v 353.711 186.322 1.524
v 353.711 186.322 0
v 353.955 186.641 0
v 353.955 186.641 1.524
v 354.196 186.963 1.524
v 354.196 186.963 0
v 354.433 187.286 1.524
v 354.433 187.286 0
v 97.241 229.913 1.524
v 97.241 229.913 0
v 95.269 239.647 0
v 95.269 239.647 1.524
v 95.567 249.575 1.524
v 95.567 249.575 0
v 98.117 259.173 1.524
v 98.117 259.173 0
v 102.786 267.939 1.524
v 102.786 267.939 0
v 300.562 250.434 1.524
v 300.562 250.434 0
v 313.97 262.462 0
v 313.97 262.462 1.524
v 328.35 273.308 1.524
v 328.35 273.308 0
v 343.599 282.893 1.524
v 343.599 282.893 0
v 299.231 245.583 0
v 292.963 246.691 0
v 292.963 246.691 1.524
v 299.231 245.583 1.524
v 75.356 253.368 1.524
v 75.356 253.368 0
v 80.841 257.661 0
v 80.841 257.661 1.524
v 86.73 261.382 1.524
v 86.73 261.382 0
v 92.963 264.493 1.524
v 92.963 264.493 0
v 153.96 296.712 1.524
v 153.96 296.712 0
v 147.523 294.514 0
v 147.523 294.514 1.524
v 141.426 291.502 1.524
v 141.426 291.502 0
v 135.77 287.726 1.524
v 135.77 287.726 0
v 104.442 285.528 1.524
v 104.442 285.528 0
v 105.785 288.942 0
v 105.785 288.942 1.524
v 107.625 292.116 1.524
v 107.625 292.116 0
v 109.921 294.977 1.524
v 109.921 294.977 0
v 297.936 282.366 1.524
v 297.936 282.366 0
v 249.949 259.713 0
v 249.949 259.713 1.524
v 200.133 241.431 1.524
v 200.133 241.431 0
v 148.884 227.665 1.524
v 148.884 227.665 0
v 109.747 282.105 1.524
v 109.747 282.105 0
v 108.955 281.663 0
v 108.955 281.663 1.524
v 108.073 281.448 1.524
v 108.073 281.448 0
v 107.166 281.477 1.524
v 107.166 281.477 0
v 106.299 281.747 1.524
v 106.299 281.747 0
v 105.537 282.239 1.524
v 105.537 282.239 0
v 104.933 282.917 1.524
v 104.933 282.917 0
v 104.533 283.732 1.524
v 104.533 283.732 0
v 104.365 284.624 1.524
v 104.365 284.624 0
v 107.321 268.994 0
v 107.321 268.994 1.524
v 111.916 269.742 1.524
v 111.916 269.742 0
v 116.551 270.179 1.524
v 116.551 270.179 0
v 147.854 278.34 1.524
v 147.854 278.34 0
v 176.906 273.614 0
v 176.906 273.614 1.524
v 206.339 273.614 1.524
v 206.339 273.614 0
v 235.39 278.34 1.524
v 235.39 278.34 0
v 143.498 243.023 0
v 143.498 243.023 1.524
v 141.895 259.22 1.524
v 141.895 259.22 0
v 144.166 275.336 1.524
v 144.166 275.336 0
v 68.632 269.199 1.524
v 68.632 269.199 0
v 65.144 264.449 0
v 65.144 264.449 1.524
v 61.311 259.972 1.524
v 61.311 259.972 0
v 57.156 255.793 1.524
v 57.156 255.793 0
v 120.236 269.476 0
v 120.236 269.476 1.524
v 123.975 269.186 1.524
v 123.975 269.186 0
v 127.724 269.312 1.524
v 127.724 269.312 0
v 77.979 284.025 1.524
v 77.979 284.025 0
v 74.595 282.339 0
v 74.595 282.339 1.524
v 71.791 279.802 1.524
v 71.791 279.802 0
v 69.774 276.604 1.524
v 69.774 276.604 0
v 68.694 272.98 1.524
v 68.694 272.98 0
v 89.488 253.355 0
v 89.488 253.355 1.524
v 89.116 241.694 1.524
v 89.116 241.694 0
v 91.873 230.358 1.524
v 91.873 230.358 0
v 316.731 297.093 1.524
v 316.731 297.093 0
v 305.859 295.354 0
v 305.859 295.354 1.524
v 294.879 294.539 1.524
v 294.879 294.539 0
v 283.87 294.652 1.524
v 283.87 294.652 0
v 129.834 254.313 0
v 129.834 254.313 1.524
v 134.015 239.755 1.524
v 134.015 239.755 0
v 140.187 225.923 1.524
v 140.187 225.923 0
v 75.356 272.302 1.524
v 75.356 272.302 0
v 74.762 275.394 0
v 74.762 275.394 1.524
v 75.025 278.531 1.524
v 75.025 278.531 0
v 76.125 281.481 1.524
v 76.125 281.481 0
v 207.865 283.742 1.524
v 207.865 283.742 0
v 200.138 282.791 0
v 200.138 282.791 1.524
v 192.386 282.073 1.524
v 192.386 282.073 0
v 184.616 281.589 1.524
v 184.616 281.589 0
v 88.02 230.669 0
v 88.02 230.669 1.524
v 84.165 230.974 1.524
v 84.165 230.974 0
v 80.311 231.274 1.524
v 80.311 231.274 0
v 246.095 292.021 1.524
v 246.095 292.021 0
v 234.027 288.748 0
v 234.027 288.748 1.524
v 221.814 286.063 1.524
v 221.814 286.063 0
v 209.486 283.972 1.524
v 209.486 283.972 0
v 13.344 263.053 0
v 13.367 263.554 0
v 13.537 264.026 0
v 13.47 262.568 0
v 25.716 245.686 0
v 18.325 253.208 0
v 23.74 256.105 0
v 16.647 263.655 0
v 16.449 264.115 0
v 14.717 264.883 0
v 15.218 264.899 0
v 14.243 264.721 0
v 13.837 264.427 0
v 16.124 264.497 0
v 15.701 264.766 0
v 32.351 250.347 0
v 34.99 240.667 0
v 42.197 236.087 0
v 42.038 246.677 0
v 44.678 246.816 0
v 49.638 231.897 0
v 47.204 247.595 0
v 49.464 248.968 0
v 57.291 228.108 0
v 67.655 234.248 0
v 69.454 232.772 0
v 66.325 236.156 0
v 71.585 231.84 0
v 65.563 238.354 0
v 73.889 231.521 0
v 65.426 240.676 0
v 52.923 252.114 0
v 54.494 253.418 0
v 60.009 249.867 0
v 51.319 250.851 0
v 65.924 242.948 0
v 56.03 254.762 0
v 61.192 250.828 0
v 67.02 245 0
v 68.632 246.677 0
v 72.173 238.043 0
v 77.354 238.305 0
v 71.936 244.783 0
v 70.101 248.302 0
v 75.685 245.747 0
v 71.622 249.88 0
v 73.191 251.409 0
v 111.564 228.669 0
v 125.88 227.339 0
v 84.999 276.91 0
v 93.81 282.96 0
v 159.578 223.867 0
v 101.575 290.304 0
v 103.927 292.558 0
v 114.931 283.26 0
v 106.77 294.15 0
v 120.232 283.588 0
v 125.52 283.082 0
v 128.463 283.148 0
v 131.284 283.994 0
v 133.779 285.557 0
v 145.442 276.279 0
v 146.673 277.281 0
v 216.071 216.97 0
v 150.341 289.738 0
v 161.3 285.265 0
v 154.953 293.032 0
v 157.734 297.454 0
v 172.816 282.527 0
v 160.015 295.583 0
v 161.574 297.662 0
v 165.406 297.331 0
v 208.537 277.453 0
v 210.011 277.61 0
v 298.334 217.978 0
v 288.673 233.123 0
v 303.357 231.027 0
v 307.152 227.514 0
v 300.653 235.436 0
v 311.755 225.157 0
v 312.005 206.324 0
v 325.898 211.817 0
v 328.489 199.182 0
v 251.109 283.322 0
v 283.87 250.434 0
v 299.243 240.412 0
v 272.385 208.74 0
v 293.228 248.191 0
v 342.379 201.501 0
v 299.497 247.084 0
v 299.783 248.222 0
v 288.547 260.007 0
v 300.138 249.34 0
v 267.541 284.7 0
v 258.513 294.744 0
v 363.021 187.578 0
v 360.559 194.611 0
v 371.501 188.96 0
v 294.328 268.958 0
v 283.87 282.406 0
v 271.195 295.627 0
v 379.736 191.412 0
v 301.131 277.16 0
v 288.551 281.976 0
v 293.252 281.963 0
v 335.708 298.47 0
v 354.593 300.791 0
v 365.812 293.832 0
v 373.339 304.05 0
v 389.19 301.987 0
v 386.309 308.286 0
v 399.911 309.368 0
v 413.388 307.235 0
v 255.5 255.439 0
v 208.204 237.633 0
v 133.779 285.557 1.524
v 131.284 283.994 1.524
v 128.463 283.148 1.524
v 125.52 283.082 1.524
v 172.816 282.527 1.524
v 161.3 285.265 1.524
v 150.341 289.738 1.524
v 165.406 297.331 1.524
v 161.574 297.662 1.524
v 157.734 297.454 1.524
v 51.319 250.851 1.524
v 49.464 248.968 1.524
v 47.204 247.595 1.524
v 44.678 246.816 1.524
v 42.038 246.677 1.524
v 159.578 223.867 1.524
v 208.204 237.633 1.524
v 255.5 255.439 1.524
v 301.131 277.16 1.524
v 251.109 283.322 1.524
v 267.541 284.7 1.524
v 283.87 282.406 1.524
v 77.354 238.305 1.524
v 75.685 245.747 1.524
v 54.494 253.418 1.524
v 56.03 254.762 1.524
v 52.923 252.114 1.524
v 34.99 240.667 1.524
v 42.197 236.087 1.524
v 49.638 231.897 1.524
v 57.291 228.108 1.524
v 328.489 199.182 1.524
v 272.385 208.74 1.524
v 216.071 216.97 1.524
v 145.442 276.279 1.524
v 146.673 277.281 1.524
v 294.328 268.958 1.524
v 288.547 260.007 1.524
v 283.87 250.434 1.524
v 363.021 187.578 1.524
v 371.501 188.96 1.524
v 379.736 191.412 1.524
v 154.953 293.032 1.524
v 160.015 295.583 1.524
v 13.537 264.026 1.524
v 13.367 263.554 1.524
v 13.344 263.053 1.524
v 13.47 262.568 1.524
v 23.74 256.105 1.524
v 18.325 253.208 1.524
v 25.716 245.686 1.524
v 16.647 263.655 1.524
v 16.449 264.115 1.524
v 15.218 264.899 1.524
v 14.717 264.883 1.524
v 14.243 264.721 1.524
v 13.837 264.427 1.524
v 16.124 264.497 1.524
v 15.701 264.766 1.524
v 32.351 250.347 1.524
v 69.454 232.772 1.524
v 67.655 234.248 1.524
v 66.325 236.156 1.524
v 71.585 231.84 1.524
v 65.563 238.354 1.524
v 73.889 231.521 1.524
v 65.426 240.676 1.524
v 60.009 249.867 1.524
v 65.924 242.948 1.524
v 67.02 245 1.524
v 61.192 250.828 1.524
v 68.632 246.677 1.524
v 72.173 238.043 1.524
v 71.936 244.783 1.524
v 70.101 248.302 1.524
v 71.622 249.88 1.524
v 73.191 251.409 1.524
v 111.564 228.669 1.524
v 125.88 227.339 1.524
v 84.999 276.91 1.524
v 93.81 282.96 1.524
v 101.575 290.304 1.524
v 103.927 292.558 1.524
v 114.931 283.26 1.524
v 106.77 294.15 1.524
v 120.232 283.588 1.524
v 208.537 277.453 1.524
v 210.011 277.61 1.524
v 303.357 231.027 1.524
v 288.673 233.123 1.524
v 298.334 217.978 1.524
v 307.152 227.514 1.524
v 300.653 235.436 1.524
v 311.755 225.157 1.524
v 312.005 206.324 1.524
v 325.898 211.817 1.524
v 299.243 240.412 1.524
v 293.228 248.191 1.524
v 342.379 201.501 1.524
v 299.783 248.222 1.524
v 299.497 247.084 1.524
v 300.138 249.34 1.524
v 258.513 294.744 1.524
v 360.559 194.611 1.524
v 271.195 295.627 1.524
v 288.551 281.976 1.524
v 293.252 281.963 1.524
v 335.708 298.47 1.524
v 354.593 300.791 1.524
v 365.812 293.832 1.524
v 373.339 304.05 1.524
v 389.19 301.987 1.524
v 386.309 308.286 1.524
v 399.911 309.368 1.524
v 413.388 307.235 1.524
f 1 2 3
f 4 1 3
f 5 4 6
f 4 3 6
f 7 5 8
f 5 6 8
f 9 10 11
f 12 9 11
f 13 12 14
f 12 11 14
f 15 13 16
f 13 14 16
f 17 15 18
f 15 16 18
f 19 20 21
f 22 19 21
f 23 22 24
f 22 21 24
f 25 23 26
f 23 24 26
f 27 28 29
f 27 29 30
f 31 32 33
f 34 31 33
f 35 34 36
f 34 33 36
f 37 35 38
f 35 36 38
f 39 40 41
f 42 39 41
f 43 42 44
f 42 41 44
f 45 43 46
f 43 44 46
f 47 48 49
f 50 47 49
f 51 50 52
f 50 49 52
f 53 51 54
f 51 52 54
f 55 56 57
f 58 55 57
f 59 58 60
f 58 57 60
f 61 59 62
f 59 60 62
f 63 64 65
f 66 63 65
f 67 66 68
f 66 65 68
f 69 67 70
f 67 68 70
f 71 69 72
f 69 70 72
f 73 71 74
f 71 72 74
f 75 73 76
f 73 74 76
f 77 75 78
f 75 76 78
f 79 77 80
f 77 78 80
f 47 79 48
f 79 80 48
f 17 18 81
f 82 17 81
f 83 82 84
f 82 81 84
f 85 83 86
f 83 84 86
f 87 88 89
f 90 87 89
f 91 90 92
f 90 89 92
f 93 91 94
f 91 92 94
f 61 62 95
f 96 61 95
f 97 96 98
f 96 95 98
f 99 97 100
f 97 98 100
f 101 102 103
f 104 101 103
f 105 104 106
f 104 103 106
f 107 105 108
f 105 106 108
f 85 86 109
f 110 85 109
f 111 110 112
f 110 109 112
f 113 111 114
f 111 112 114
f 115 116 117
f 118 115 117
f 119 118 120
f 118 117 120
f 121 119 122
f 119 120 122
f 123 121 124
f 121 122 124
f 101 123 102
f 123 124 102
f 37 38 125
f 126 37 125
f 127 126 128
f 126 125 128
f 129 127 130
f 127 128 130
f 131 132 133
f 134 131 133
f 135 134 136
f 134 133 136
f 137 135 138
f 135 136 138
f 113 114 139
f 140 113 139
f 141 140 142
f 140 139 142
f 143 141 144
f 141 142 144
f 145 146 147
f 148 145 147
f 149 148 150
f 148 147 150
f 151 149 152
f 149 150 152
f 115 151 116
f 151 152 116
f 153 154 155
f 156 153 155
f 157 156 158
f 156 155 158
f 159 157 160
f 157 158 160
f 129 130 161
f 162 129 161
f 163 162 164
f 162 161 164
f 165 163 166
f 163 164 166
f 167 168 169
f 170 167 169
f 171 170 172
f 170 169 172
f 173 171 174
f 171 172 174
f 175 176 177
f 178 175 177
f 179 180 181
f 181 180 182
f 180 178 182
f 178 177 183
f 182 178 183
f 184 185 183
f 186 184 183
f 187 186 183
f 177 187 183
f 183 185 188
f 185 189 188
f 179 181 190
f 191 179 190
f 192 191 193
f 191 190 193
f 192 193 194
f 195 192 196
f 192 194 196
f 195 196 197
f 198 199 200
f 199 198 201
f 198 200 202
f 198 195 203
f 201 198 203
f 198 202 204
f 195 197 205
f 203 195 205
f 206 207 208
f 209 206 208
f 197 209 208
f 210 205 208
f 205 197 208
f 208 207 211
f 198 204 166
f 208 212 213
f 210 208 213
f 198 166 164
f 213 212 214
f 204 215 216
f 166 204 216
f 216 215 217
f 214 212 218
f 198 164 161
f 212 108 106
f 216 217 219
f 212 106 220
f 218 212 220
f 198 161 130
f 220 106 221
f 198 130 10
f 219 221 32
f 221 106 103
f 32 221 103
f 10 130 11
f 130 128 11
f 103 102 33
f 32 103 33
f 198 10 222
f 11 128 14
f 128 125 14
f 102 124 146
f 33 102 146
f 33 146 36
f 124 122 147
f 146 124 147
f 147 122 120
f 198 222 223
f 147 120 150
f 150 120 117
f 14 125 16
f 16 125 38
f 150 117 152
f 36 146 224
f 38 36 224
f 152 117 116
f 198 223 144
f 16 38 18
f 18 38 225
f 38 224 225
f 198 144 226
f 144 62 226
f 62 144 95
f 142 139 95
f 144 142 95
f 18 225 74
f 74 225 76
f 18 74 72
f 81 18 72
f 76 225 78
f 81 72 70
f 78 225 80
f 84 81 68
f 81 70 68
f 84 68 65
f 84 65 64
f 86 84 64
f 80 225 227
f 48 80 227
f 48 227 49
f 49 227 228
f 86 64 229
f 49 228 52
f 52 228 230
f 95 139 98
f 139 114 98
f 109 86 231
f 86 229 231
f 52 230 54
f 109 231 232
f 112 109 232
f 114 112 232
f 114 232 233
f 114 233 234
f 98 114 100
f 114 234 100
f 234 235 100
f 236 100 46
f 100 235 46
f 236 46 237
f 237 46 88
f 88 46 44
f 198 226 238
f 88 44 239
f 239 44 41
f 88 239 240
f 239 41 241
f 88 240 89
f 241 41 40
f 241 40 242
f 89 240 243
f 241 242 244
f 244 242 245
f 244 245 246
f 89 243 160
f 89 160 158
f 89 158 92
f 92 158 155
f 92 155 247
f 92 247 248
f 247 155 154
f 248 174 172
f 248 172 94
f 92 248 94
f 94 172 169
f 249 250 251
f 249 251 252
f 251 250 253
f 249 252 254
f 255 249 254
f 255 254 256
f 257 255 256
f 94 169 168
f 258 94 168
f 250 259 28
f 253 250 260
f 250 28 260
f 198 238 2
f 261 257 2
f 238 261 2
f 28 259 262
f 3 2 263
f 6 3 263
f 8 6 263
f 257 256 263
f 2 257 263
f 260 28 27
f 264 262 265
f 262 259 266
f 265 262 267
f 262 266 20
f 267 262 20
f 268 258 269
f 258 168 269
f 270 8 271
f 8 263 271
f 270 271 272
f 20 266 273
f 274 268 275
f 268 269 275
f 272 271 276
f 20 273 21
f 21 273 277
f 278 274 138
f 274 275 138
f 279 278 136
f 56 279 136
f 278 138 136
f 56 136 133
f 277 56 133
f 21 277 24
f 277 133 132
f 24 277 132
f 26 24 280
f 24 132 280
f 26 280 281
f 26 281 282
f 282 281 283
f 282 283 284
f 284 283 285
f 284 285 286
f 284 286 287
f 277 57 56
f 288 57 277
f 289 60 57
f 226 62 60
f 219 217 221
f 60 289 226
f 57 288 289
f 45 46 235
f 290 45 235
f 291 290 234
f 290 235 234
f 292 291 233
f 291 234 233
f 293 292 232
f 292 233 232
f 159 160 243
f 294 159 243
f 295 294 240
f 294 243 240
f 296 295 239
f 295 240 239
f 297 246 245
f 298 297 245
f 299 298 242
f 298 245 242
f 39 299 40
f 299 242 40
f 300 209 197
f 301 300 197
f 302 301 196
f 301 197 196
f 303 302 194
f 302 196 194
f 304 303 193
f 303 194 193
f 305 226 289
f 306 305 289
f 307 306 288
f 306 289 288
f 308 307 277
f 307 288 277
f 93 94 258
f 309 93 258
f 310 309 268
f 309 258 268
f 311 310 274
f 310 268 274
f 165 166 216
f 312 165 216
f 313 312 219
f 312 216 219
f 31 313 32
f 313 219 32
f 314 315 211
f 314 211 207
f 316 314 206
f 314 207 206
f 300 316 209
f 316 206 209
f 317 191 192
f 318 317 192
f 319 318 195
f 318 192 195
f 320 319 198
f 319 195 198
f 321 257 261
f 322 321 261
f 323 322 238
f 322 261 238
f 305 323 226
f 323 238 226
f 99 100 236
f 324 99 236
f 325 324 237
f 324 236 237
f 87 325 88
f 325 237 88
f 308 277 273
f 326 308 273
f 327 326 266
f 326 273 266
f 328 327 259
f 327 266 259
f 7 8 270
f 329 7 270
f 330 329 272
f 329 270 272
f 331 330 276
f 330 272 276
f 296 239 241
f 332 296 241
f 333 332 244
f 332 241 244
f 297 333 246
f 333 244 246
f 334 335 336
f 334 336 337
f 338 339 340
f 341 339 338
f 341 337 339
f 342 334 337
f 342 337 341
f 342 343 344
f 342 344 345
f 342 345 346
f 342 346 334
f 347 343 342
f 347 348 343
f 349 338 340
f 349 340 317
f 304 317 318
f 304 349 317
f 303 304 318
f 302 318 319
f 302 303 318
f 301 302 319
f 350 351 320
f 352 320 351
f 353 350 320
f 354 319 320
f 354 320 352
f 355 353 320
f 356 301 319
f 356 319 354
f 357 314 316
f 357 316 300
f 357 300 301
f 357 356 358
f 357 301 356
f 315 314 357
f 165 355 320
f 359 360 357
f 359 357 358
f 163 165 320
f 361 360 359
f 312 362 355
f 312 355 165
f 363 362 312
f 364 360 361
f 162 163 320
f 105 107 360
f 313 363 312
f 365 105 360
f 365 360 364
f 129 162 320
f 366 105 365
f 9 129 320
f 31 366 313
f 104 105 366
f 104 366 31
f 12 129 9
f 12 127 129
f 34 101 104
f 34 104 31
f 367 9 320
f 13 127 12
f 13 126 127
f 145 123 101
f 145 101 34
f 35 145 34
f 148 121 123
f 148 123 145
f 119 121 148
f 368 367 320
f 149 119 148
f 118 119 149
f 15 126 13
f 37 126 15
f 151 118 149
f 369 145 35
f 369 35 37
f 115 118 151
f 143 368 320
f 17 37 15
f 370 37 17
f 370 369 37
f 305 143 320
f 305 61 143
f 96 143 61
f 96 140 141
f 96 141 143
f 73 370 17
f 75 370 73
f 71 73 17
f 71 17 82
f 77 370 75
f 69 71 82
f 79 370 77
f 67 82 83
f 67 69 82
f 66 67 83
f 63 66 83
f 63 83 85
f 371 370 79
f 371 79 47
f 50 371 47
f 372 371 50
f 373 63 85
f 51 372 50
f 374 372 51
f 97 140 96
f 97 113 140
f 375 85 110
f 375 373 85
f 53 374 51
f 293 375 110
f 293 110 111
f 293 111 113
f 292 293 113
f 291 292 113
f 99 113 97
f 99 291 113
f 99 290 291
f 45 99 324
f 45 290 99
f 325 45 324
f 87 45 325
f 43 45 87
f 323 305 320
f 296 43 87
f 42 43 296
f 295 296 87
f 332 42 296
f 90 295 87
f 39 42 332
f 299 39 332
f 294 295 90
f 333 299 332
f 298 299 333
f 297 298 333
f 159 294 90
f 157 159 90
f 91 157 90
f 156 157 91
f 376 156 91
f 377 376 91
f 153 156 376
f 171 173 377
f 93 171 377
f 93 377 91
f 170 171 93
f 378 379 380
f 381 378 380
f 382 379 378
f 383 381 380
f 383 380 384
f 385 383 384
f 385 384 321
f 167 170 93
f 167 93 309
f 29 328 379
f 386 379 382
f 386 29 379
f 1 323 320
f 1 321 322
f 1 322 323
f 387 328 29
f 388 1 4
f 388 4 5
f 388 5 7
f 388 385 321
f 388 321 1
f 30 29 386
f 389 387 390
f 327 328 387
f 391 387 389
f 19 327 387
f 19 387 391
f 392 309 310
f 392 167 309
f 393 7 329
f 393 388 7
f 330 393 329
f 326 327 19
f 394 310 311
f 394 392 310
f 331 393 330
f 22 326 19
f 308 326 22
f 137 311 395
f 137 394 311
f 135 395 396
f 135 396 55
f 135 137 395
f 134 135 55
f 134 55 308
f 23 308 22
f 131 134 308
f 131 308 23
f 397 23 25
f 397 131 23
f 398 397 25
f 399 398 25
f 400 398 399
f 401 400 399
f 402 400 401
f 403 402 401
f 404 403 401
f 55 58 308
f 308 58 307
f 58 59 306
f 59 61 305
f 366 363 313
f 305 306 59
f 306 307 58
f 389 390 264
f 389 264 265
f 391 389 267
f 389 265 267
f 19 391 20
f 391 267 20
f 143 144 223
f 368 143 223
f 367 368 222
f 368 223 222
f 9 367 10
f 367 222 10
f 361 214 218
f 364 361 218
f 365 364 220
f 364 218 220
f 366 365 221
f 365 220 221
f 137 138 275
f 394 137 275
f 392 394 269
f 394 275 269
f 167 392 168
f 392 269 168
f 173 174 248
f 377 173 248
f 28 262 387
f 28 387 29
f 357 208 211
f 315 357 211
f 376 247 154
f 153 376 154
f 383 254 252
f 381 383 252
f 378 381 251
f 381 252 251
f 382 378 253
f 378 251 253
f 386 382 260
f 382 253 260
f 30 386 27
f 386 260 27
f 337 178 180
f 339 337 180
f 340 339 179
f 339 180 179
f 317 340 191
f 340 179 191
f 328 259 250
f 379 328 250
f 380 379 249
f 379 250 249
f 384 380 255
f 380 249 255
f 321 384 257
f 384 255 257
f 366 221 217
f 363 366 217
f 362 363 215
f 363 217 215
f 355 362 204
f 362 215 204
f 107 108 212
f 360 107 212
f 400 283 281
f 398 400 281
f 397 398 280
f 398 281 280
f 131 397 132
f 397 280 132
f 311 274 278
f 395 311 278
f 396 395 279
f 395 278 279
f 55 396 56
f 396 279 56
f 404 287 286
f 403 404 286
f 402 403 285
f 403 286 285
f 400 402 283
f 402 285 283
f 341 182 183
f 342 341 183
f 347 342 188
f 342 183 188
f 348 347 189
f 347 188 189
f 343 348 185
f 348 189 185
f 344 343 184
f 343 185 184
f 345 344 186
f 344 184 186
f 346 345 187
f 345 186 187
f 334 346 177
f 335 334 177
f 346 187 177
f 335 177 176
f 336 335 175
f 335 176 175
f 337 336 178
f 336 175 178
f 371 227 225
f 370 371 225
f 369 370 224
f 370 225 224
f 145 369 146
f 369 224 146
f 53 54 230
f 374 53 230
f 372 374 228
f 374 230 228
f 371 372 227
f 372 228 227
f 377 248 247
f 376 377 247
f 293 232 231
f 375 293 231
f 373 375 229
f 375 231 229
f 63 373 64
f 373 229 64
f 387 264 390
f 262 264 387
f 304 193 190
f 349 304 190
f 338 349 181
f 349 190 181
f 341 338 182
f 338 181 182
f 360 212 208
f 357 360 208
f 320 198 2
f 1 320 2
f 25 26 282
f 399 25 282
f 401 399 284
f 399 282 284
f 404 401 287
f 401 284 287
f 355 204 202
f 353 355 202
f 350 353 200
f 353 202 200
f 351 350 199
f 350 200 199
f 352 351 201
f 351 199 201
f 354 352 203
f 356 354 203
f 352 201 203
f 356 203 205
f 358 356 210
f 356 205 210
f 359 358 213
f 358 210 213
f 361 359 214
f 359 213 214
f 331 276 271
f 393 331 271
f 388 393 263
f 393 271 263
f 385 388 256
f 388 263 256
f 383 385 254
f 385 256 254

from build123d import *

# Parameters (mm, degrees)
BOSS_EXTRUDE1_DEPTH = 1.524
CUT_EXTRUDE1_DEPTH  = 1.524


with BuildPart() as part:
    # Sketch1 → Boss-Extrude1 (new body)
    with BuildSketch(Plane.XY):
        with BuildLine():
            Line((57.290824473, 228.108297044), (353.711488573, 186.321991739))
            ThreePointArc((353.711488573, 186.321991739), (354.075780486, 186.801693195), (354.433282196, 187.286476253))
            ThreePointArc((354.433282196, 187.286476253), (367.282944414, 188.133579217), (379.736207542, 191.411938565))
            ThreePointArc((379.736207542, 191.411938565), (342.378628376, 201.501430101), (311.755483248, 225.157497886))
            ThreePointArc((311.755483248, 225.157497886), (300.682282637, 235.370307227), (300.562470929, 250.433603398))
            ThreePointArc((300.562470929, 250.433603398), (321.044455039, 268.037495843), (343.59946469, 282.892806069))
            ThreePointArc((343.59946469, 282.892806069), (377.376618301, 298.266191923), (413.38768552, 307.235034456))
            ThreePointArc((413.38768552, 307.235034456), (393.078041438, 309.22946311), (373.338877641, 304.050196657))
            ThreePointArc((373.338877641, 304.050196657), (345.164765747, 299.513120241), (316.730515739, 297.09256867))
            ThreePointArc((316.730515739, 297.09256867), (300.377514826, 294.830345717), (283.869742792, 294.652149172))
            ThreePointArc((283.869742792, 294.652149172), (264.837645669, 295.417547796), (246.095409129, 292.02120779))
            ThreePointArc((246.095409129, 292.02120779), (215.671555063, 284.944519585), (184.616227681, 281.589366329))
            ThreePointArc((184.616227681, 281.589366329), (167.005302639, 283.674185668), (150.340503018, 289.738475081))
            ThreePointArc((150.340503018, 289.738475081), (157.435124743, 294.404562686), (165.406340408, 297.331293248))
            ThreePointArc((165.406340408, 297.331293248), (159.650281584, 297.625042258), (153.959513951, 296.711989461))
            ThreePointArc((153.959513951, 296.711989461), (144.425837897, 293.107350234), (135.76973662, 287.726243123))
            ThreePointArc((135.76973662, 287.726243123), (131.283660572, 283.993726612), (125.519570472, 283.081683228))
            ThreePointArc((125.519570472, 283.081683228), (117.575446144, 283.528434685), (109.74705726, 282.10540072))
            ThreePointArc((109.74705726, 282.10540072), (105.901175076, 281.967449489), (104.441699592, 285.528316185))
            ThreePointArc((104.441699592, 285.528316185), (106.645115294, 290.563839268), (109.921107262, 294.977387738))
            ThreePointArc((109.921107262, 294.977387738), (105.298186283, 293.444448732), (101.575381834, 290.304062227))
            ThreePointArc((101.575381834, 290.304062227), (89.522712553, 279.763084543), (75.355674106, 272.301578731))
            ThreePointArc((75.355674106, 272.301578731), (75.025286429, 278.530980407), (77.97930542, 284.025375103))
            ThreePointArc((77.97930542, 284.025375103), (70.672937053, 278.271974974), (68.631929607, 269.198997493))
            ThreePointArc((68.631929607, 269.198997493), (60.712120021, 259.329966949), (51.319192238, 250.850930717))
            ThreePointArc((51.319192238, 250.850930717), (47.204267049, 247.59528857), (42.038095614, 246.677417222))
            ThreePointArc((42.038095614, 246.677417222), (27.881645016, 252.981360845), (16.64661192, 263.65463729))
            ThreePointArc((16.64661192, 263.65463729), (14.473805053, 264.820038124), (13.469532472, 262.568219888))
            ThreePointArc((13.469532472, 262.568219888), (21.739819765, 249.170959745), (34.989718338, 240.66658328))
            ThreePointArc((34.989718338, 240.66658328), (45.889493734, 233.942107147), (57.290824473, 228.108297044))
        make_face()
        with BuildLine():
            ThreePointArc((328.489226954, 199.182421433), (244.252401976, 213.020971981), (159.578269796, 223.867146564))
            ThreePointArc((159.578269796, 223.867146564), (232.039463881, 246.03834442), (301.131135651, 277.159519764))
            ThreePointArc((301.131135651, 277.159519764), (291.304602068, 264.568913579), (283.869742792, 250.433603398))
            ThreePointArc((283.869742792, 250.433603398), (298.334085197, 217.977776055), (328.489226954, 199.182421433))
        make_face(mode=Mode.SUBTRACT)
        with BuildLine():
            ThreePointArc((73.889360105, 231.521400998), (65.868365727, 237.228895624), (68.631929607, 246.677417222))
            ThreePointArc((68.631929607, 246.677417222), (70.855224439, 249.097244695), (73.19077168, 251.408915949))
            ThreePointArc((73.19077168, 251.408915949), (71.867025962, 241.406389626), (73.889360105, 231.521400998))
        make_face(mode=Mode.SUBTRACT)
        with BuildLine():
            ThreePointArc((116.551068066, 270.179316334), (122.101400858, 269.279382121), (127.7241229, 269.312131715))
            ThreePointArc((127.7241229, 269.312131715), (131.669689581, 246.96106507), (140.187225602, 225.923259654))
            ThreePointArc((140.187225602, 225.923259654), (118.722956961, 228.014416663), (97.240833112, 229.913395557))
            ThreePointArc((97.240833112, 229.913395557), (95.566690644, 249.574533087), (102.786152544, 267.938695246))
            ThreePointArc((102.786152544, 267.938695246), (109.612083308, 269.406270814), (116.551068066, 270.179316334))
        make_face(mode=Mode.SUBTRACT)
        with BuildLine():
            ThreePointArc((147.854387632, 278.340365744), (191.622365865, 273.02026195), (235.390344097, 278.340365744))
            ThreePointArc((235.390344097, 278.340365744), (259.286439501, 284.470493189), (283.869742792, 282.405780779))
            ThreePointArc((283.869742792, 282.405780779), (290.901656942, 281.917548628), (297.936216355, 282.366058505))
            ThreePointArc((297.936216355, 282.366058505), (225.245012107, 250.01614522), (148.884216081, 227.665375775))
            ThreePointArc((148.884216081, 227.665375775), (142.212285393, 251.073648633), (144.166314335, 275.335628523))
            ThreePointArc((144.166314335, 275.335628523), (146.063284577, 276.773025404), (147.854387632, 278.340365744))
        make_face(mode=Mode.SUBTRACT)
        with BuildLine():
            ThreePointArc((92.963126534, 264.492689611), (88.906900231, 247.537272471), (91.873275106, 230.357640278))
            ThreePointArc((91.873275106, 230.357640278), (86.092526476, 230.822576823), (80.310675632, 231.273599578))
            ThreePointArc((80.310675632, 231.273599578), (76.354412107, 241.989032993), (75.355674106, 253.367743674))
            ThreePointArc((75.355674106, 253.367743674), (83.738923989, 259.595704551), (92.963126534, 264.492689611))
        make_face(mode=Mode.SUBTRACT)
    extrude(amount=BOSS_EXTRUDE1_DEPTH)

    # Sketch2 → Cut-Extrude1 (cut)
    with BuildSketch(Plane(origin=(0, 0, 0), x_dir=(-1, 0, 0), z_dir=(0, 0, -1))):
        Polygon((-293.228442315, 248.191486466), (-292.963264261, 246.690734455), (-301.831560839, 245.123734967), (-302.096738893, 246.624486978), align=None)
        Polygon((-210.010989789, 277.610431446), (-208.536964433, 277.452860551), (-207.725093618, 285.047652502), (-209.384282149, 285.202159423), align=None)
        Polygon((-61.191894588, 250.827806426), (-60.009228178, 249.866621656), (-54.939782062, 256.104198263), (-56.208453293, 256.959560494), align=None)
    extrude(amount=-CUT_EXTRUDE1_DEPTH, mode=Mode.SUBTRACT)


solid = part.part
